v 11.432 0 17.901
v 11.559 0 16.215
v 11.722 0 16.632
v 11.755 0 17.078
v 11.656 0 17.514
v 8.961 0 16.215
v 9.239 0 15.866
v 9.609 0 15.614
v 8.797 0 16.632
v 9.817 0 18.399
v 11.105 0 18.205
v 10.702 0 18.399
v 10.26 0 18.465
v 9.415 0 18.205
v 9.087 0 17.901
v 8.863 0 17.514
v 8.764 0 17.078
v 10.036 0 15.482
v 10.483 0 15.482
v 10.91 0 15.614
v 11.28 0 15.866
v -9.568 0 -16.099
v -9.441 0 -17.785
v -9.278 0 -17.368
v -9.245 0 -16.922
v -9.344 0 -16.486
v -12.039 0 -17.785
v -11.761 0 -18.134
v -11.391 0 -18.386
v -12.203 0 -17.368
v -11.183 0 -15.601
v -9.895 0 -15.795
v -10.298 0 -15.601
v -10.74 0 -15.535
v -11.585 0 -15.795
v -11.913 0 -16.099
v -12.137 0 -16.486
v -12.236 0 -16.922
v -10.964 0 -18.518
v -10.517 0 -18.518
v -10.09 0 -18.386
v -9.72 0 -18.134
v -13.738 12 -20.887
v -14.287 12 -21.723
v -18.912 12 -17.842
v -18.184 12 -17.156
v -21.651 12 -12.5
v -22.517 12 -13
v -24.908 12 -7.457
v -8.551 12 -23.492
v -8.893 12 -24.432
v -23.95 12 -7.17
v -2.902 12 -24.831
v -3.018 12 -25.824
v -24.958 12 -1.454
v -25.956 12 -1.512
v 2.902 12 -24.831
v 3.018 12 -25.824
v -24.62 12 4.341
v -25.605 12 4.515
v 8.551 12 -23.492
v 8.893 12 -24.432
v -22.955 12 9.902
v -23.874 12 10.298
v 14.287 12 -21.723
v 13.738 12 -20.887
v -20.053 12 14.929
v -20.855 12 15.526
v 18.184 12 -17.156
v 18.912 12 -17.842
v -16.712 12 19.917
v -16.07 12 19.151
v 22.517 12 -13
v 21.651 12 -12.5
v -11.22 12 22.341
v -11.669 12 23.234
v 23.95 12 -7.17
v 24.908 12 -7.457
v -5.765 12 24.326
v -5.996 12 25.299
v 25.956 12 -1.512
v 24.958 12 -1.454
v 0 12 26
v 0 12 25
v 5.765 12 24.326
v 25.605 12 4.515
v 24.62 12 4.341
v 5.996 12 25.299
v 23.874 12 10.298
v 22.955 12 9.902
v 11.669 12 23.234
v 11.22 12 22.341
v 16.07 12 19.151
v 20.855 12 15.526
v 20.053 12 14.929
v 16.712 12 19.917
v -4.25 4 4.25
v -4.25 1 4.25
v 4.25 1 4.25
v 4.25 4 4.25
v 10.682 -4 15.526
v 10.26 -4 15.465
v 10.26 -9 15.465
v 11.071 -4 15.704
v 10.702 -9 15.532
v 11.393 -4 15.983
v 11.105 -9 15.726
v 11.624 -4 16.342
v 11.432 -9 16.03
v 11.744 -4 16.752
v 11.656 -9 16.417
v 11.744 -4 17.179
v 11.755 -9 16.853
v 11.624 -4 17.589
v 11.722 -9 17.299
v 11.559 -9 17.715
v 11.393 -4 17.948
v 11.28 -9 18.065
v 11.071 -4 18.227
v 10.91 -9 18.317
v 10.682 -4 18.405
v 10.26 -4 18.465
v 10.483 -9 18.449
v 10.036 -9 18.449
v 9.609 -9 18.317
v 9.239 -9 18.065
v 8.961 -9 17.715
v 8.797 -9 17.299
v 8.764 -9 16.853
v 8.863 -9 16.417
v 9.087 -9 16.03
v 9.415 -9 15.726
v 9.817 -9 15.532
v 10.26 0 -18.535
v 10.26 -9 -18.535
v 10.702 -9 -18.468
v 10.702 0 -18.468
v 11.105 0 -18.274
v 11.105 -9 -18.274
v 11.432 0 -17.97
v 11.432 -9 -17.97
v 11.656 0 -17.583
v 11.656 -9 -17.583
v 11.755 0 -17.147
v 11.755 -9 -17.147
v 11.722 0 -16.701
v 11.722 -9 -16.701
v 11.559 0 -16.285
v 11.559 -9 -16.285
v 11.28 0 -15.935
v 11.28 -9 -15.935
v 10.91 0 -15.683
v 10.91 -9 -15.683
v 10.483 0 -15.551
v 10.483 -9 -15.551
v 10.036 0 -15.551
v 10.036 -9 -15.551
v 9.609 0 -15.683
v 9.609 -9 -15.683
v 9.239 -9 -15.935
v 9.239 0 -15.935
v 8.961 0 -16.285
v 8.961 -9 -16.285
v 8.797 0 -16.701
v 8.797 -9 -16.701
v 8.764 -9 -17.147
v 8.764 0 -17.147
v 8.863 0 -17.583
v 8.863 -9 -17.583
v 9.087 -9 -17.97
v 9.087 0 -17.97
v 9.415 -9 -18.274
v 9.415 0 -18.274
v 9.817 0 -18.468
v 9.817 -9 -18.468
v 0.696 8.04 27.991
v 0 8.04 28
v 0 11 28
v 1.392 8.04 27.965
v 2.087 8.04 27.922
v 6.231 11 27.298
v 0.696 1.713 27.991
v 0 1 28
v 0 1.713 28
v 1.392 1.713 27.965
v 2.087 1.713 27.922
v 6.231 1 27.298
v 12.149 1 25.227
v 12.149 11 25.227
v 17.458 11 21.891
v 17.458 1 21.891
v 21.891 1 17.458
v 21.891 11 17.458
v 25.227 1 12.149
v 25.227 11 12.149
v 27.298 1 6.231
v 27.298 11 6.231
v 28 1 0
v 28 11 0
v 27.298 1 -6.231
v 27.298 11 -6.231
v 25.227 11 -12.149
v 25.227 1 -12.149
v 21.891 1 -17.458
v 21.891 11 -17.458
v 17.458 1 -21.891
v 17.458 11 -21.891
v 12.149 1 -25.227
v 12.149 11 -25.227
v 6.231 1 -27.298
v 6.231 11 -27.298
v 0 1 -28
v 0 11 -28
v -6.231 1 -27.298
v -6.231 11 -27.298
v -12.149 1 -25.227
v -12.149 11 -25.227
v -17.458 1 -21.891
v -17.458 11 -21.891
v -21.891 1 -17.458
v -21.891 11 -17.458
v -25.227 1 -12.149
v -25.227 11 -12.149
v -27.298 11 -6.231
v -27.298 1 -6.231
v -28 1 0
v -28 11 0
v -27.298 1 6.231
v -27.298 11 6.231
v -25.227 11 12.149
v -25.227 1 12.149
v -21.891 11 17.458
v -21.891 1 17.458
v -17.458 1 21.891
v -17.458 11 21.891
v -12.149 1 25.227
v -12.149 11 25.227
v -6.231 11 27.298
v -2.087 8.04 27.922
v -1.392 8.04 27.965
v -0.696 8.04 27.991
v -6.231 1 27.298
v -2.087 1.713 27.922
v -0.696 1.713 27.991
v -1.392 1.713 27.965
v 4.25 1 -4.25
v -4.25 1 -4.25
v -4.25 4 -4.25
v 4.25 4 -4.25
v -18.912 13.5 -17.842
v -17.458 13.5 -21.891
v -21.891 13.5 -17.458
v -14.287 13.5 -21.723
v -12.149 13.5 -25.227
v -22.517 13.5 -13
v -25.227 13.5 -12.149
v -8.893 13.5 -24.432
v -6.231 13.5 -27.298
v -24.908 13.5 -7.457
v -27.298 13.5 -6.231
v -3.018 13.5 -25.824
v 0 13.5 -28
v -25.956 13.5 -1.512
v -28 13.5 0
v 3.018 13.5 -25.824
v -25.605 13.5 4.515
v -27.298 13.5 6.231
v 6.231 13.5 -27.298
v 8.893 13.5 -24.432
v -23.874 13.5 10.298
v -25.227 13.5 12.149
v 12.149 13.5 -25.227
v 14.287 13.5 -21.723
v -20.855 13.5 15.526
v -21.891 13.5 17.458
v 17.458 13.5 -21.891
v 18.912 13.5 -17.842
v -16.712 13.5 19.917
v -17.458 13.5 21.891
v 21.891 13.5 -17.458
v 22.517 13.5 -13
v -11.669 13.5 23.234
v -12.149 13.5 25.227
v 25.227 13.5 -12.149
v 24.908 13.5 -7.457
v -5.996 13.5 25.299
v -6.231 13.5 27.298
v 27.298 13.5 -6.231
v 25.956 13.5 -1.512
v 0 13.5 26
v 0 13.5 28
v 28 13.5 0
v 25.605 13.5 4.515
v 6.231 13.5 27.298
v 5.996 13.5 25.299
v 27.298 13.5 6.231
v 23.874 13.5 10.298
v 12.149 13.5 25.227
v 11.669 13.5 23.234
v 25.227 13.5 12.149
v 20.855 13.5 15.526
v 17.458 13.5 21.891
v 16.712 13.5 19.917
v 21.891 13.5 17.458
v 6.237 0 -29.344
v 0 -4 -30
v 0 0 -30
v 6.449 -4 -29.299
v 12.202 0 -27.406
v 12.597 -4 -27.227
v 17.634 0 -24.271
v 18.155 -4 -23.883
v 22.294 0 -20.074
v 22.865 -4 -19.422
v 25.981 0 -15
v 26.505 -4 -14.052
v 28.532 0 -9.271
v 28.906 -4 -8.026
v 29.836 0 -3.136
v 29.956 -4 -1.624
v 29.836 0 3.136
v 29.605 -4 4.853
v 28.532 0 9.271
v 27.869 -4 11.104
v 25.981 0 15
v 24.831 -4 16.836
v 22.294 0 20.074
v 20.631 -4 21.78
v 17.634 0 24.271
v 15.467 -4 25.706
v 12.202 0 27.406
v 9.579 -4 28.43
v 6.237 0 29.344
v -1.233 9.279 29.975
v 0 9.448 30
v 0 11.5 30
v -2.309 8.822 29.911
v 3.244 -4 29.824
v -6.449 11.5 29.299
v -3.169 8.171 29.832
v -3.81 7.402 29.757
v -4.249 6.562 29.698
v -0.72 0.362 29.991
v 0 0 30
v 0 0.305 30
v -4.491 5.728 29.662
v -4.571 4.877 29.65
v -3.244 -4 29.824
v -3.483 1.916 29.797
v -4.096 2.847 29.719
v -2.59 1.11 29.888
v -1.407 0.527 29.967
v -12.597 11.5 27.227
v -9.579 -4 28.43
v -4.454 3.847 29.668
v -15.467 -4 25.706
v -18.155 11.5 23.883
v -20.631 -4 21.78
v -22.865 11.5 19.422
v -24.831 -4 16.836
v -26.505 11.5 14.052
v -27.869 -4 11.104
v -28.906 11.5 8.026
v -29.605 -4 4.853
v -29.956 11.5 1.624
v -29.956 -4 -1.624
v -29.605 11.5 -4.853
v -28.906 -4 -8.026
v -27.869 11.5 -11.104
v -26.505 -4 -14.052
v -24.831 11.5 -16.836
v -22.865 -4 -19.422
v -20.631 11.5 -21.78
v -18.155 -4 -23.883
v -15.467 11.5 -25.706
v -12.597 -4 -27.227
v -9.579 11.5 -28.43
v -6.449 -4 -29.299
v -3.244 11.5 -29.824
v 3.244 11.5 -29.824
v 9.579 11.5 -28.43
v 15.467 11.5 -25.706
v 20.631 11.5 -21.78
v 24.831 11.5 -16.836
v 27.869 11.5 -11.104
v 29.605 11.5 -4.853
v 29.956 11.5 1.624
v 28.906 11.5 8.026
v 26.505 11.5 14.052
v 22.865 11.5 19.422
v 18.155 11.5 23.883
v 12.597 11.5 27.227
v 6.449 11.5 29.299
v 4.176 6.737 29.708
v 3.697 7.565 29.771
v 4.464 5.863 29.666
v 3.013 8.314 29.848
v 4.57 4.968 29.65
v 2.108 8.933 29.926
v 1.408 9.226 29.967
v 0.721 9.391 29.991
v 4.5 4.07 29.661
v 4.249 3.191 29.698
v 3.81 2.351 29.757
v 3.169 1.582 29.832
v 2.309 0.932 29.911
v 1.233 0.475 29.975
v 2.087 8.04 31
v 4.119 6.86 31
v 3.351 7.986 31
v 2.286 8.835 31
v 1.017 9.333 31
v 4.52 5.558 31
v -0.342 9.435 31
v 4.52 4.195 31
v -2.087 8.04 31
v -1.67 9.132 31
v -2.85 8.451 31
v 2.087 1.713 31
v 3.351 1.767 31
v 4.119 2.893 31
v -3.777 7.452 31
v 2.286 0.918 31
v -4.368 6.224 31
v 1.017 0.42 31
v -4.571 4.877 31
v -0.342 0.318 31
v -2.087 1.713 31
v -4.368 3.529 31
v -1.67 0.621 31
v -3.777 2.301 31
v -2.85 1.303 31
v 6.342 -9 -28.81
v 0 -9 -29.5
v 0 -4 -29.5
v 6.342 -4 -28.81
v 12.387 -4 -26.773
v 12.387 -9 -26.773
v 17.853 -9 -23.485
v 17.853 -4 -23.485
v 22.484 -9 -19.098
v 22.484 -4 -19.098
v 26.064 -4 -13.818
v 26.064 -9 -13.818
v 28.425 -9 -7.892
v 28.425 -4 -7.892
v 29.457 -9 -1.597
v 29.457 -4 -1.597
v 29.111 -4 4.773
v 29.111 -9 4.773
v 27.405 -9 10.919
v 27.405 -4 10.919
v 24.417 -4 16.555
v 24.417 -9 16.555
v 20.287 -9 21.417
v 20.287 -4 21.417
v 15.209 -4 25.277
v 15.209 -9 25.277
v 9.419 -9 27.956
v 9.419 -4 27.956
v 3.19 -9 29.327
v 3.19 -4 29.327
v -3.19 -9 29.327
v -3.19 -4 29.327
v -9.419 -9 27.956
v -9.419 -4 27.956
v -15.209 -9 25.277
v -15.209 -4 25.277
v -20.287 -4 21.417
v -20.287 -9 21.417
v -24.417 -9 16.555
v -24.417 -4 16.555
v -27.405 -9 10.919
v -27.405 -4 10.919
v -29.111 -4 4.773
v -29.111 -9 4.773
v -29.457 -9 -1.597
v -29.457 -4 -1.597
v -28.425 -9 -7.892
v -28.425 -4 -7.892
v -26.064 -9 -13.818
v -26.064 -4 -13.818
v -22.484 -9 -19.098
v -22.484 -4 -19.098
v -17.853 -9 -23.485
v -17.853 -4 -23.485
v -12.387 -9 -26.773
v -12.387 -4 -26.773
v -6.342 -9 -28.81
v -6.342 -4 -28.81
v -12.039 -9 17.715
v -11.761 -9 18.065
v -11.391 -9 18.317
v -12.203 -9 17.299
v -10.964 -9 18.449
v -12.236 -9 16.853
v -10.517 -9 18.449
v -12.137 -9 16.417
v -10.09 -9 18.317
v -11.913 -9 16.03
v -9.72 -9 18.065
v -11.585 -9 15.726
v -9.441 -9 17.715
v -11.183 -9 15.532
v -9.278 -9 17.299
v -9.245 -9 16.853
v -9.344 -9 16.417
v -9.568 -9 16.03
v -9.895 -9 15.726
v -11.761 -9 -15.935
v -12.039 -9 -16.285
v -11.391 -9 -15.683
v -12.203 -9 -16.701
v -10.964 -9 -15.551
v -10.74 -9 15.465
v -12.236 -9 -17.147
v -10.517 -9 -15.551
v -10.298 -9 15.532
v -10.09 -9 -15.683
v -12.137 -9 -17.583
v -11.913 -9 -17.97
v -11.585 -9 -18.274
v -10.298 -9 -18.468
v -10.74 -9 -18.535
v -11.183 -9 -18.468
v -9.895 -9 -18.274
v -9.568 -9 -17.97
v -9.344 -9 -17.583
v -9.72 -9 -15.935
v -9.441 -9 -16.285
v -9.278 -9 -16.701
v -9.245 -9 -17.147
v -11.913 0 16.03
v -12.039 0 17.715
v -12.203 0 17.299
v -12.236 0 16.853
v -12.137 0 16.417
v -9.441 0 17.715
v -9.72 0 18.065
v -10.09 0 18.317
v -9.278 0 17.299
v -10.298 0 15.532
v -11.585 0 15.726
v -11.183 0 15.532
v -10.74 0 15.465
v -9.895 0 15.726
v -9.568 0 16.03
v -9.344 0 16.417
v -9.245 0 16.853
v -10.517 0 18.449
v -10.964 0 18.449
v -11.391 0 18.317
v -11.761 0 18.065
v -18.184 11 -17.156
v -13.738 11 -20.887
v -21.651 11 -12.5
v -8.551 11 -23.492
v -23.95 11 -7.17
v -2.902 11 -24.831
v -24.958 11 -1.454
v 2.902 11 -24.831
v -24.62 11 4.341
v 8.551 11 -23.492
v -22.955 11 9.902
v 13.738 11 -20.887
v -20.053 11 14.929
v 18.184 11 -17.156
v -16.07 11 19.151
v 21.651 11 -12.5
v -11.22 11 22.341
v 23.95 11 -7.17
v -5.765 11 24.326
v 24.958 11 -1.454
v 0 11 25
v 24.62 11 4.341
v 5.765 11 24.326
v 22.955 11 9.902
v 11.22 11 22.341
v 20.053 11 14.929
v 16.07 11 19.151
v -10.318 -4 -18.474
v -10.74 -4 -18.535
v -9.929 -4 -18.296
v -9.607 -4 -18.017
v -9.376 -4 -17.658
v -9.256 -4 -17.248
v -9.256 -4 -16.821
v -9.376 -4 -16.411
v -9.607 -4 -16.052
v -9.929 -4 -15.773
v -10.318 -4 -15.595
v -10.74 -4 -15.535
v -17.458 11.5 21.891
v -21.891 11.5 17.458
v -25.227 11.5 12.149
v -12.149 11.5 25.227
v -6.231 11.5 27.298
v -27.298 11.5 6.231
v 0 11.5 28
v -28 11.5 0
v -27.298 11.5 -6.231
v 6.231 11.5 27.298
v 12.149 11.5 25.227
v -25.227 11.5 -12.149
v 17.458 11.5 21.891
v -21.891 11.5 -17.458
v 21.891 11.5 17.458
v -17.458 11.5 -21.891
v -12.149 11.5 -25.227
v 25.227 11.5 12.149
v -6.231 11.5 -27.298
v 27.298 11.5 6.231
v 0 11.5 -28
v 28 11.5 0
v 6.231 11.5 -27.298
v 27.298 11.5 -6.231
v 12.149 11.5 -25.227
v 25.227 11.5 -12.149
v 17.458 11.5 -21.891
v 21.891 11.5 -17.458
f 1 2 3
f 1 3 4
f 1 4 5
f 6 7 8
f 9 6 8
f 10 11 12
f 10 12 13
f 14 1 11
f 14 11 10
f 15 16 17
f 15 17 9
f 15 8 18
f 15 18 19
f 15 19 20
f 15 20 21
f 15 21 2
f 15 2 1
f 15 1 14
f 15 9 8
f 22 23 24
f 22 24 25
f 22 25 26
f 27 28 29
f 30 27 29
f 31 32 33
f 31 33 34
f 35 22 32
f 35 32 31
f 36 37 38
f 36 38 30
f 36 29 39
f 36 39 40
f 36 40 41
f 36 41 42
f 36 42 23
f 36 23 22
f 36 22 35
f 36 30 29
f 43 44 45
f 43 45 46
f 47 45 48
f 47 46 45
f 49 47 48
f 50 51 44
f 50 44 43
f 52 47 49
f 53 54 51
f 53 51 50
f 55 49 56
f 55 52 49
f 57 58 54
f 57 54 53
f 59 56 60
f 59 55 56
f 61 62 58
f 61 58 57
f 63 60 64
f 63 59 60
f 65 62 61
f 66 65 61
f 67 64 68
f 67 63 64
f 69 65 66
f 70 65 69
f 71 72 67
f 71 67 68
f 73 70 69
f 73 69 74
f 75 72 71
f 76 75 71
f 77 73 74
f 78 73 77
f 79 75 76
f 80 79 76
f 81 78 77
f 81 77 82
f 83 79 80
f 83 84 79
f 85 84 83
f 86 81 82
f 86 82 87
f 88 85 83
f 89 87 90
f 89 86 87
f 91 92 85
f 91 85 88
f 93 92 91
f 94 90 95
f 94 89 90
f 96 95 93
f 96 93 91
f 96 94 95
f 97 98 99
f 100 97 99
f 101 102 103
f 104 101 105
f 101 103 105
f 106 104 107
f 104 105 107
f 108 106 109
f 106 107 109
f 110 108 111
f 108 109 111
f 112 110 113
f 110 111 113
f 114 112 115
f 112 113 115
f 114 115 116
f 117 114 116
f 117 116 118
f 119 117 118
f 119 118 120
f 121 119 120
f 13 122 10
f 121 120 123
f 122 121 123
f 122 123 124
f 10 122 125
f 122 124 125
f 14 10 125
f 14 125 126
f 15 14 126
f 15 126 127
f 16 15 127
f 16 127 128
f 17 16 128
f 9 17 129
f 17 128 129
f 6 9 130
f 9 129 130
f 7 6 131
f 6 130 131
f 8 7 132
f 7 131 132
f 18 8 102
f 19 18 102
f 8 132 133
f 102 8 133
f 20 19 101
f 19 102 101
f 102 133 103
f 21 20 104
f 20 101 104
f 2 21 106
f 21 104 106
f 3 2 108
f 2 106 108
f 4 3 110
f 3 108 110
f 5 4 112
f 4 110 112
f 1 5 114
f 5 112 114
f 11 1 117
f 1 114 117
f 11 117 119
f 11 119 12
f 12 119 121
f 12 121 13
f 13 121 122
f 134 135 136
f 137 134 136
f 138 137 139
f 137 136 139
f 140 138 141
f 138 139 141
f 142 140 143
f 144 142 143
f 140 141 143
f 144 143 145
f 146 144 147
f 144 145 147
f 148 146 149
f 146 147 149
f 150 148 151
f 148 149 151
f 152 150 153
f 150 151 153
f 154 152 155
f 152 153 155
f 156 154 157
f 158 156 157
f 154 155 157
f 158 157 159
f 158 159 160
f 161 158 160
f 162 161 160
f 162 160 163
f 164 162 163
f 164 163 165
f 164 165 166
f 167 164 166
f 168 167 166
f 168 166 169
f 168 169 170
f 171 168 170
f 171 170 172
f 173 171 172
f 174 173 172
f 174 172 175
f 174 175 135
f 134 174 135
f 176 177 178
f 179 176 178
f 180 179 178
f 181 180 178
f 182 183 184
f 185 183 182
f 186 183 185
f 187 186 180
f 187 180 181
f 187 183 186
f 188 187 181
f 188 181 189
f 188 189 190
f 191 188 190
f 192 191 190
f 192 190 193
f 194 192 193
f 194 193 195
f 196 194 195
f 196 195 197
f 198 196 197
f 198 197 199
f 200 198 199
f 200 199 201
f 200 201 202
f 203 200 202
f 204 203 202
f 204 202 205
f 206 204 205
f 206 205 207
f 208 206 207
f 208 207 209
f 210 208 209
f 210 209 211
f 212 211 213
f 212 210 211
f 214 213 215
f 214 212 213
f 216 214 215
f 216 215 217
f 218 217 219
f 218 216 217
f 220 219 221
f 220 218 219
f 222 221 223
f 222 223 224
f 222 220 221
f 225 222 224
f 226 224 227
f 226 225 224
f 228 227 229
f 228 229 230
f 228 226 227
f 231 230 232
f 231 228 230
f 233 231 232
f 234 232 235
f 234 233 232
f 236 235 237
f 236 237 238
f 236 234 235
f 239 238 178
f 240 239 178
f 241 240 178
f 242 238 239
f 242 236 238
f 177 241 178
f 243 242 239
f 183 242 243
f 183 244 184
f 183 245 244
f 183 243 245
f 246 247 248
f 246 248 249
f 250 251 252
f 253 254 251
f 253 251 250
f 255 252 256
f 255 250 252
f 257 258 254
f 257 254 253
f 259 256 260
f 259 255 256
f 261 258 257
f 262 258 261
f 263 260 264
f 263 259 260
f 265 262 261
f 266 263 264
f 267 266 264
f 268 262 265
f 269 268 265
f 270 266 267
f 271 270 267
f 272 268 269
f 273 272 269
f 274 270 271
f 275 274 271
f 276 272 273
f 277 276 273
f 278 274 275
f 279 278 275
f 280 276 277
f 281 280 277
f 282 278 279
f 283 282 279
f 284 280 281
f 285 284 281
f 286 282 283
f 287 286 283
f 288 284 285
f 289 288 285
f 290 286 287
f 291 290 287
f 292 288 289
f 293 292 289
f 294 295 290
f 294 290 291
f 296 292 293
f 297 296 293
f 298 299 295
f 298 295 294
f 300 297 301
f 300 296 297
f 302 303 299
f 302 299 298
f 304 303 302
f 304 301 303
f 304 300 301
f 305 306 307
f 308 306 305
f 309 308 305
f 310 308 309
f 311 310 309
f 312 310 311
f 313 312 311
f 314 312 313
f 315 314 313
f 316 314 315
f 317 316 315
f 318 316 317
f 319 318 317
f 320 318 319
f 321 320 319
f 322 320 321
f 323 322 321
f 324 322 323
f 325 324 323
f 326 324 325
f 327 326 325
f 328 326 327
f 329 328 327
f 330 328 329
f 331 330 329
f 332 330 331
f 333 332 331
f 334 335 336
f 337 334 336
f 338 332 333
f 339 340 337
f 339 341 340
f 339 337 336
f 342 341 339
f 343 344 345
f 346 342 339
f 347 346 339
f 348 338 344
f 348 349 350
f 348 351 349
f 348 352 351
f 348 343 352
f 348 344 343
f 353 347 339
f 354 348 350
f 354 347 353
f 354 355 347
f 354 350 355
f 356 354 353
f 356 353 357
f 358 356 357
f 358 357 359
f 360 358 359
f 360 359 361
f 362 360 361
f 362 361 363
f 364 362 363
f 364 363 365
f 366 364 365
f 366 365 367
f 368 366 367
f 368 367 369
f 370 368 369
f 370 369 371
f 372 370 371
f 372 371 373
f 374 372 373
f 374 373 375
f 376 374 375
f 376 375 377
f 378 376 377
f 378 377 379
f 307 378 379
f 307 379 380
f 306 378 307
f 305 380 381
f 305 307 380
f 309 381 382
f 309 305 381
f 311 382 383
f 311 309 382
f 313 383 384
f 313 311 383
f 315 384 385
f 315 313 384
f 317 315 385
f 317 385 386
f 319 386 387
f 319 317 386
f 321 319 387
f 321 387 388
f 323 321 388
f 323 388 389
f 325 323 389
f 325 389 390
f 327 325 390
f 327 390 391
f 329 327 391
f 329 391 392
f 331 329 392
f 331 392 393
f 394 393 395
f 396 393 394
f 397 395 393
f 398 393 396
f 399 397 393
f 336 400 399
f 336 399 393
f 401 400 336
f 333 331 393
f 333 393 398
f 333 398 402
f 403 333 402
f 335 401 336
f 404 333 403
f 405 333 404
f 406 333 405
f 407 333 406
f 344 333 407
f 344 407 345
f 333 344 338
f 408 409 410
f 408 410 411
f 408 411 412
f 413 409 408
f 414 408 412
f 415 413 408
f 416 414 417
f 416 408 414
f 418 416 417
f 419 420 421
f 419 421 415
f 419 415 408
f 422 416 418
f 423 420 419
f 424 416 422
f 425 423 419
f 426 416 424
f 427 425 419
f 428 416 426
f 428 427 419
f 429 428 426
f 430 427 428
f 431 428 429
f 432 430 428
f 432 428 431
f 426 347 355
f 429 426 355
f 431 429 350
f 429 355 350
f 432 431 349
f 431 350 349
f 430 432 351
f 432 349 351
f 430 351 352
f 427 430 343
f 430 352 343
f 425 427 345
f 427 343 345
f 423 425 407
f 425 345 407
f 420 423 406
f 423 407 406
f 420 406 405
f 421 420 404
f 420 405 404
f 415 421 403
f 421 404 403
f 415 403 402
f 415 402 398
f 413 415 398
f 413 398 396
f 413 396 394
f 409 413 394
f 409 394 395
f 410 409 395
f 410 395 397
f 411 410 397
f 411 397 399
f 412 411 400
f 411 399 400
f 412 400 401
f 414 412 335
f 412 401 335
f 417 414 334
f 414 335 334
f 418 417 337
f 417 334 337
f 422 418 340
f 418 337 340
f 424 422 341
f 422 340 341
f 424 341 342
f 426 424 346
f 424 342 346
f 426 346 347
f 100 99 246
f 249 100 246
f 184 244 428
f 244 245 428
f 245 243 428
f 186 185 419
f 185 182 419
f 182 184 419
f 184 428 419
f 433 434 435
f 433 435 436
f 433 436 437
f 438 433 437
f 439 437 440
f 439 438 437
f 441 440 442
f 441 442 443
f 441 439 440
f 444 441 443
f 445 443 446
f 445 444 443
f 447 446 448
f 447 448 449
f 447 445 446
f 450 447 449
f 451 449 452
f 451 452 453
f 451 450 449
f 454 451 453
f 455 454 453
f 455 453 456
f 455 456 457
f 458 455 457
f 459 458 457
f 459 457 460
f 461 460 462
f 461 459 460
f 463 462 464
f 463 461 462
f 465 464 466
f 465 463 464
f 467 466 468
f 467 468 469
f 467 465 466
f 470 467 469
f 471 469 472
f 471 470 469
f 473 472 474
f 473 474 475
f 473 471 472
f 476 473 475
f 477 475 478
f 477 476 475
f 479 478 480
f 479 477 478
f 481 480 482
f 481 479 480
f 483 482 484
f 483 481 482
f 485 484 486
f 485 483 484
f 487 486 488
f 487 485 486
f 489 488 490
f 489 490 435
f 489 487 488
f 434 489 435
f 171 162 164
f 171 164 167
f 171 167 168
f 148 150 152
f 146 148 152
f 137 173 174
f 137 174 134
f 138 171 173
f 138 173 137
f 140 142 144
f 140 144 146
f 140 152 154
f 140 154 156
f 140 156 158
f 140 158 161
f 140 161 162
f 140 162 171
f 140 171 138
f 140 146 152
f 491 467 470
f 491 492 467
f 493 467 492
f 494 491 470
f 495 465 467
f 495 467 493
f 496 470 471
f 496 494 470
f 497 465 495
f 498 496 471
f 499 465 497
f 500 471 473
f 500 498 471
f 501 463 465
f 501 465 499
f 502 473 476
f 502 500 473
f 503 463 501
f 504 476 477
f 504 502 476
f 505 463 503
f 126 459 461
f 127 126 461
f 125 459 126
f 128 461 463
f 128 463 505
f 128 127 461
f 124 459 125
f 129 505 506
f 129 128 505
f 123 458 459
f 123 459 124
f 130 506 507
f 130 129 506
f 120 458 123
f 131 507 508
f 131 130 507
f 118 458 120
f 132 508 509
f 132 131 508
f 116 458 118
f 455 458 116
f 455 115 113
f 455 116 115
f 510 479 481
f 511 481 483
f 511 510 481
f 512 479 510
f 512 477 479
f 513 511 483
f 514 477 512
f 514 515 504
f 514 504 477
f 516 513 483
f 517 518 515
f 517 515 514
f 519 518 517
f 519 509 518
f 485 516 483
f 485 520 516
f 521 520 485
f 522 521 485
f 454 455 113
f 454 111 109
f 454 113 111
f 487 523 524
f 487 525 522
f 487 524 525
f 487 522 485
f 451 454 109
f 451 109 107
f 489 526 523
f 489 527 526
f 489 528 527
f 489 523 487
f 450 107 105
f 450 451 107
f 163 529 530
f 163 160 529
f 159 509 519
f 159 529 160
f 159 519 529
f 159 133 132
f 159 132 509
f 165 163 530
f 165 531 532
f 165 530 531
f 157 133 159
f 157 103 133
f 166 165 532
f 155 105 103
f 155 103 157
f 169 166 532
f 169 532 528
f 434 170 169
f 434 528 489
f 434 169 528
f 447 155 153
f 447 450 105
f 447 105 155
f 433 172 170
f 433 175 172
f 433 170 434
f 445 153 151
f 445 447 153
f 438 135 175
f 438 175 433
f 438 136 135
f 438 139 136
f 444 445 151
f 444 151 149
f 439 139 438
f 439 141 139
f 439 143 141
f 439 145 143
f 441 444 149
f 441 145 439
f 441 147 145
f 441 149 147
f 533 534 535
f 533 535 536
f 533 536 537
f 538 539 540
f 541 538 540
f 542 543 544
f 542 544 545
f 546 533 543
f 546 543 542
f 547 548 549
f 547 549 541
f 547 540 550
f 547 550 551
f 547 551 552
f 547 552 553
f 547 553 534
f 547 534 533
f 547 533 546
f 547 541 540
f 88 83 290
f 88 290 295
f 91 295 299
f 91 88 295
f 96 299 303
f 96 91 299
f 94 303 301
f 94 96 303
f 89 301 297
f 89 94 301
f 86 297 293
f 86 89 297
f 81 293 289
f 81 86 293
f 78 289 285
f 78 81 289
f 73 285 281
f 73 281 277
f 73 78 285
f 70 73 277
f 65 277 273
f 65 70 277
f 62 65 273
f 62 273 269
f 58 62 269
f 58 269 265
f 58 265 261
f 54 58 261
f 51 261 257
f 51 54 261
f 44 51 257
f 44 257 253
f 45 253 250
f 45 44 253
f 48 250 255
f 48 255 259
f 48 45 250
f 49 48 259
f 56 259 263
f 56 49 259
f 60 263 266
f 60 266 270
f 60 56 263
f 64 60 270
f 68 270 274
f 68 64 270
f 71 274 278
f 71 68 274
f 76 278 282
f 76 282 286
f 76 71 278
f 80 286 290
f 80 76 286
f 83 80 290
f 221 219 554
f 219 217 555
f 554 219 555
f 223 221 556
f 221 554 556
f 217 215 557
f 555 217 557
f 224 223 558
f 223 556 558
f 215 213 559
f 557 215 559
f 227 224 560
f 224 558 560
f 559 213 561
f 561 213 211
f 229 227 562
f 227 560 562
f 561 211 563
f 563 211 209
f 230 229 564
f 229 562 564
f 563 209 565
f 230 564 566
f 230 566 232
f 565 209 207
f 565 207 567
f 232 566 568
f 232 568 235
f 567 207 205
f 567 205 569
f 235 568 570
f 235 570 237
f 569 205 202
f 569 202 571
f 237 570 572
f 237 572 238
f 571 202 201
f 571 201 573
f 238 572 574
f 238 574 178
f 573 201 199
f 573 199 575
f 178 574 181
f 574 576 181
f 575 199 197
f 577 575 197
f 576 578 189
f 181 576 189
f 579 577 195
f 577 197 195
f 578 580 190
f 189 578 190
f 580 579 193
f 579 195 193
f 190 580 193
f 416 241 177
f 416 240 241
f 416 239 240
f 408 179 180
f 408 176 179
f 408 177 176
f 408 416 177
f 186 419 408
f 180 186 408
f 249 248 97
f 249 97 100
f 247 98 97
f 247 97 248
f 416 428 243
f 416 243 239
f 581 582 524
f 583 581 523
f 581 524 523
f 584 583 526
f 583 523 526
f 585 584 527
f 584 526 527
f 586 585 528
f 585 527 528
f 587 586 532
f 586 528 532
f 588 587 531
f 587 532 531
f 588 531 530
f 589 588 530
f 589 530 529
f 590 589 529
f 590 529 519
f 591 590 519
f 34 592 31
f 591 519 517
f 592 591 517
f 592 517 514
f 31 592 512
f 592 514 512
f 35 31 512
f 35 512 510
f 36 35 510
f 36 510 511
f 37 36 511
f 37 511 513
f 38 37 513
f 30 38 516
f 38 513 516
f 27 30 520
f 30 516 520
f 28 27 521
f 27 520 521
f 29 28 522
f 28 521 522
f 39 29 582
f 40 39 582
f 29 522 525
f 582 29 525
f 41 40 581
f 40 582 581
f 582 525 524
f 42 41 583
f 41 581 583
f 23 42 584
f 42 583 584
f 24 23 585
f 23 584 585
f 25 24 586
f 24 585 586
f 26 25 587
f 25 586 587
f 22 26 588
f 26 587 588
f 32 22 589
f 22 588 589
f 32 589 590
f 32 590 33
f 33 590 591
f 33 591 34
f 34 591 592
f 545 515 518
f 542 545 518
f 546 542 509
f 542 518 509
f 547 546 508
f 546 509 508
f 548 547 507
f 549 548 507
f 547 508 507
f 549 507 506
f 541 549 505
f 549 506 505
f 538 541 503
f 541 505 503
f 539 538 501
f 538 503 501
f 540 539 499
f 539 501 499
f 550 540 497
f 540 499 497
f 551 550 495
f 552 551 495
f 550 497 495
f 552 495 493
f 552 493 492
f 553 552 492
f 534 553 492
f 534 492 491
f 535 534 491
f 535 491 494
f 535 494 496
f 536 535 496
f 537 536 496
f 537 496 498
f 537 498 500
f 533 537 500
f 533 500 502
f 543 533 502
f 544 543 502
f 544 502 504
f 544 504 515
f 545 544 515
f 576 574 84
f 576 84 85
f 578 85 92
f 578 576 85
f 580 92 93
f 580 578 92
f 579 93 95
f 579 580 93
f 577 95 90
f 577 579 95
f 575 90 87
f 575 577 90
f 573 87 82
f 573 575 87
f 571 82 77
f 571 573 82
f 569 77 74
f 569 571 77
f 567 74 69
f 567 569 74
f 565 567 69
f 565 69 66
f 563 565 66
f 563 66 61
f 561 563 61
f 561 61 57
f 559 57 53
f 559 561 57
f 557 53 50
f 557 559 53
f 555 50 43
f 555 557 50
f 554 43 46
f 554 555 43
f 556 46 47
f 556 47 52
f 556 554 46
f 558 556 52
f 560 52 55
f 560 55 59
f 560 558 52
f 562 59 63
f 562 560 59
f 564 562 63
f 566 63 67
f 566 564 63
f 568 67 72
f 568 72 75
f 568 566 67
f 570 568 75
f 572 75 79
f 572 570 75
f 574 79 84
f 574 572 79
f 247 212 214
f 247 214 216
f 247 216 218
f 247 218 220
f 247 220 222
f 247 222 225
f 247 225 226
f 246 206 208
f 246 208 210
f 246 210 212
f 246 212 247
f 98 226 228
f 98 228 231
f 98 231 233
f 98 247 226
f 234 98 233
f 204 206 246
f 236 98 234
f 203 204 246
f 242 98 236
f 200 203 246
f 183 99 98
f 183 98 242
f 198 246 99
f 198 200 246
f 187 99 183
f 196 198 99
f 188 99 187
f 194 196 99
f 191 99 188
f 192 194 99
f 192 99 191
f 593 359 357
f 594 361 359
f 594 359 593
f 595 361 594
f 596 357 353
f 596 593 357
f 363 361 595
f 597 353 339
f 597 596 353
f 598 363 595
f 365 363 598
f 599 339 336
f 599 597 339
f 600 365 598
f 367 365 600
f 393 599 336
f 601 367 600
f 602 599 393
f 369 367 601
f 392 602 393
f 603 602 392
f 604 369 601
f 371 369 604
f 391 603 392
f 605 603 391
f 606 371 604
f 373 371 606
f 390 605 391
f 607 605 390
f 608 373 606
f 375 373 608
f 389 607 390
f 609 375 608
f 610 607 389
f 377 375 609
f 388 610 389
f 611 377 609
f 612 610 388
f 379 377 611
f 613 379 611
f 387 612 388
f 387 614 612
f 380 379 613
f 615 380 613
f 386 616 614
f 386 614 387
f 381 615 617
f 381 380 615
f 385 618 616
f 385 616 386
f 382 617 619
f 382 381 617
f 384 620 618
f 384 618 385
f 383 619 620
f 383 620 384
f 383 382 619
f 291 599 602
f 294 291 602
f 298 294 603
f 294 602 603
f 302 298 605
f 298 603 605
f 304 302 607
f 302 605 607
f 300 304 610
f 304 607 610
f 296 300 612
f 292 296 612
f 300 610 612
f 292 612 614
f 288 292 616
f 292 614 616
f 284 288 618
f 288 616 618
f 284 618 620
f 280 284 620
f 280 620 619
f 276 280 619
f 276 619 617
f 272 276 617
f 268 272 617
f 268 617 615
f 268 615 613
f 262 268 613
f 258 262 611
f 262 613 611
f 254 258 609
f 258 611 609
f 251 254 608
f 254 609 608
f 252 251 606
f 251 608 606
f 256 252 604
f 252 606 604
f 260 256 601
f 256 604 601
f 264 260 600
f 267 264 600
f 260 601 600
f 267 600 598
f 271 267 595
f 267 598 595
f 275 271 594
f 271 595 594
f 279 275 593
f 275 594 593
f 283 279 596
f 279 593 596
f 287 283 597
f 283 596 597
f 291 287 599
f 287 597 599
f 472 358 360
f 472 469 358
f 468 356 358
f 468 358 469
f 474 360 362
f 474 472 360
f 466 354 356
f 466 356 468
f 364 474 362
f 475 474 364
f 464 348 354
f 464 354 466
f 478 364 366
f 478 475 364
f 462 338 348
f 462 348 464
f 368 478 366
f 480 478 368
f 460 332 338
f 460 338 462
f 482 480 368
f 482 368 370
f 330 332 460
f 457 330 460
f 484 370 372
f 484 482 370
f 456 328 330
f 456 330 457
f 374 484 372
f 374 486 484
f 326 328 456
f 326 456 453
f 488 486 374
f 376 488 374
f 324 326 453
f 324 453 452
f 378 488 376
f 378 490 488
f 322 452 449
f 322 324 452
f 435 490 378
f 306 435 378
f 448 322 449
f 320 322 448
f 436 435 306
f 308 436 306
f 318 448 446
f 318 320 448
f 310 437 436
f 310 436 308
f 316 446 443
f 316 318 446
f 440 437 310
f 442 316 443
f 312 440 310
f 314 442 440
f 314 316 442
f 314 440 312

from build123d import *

# Parameters (mm, degrees)
SKETCH_1_R          = 30
EXTRUDE_1_DEPTH     = 1
SKETCH_10_R         = 30
SKETCH_10_R_2       = 28
EXTRUDE_4_DEPTH     = 10
SKETCH_11_W         = 8.5
SKETCH_11_H         = 8.5
EXTRUDE_5_DEPTH     = 3
EXTRUDE_START       = 29
SKETCH_17_R         = 4.571283513
EXTRUDE_6_DEPTH     = 2
SKETCH_18_W         = 4.174244664
SKETCH_18_H         = 6.326589568
CUT_EXTRUDE_5_DEPTH = 10
SKETCH_19_R         = 30
SKETCH_19_R_2       = 25
EXTRUDE_7_DEPTH     = 1
SKETCH_23_R         = 30
SKETCH_23_R_2       = 26
EXTRUDE_8_DEPTH     = 1.5
CUT_EXTRUDE_START   = -2
SKETCH_24_R         = 32
SKETCH_24_R_2       = 28
CUT_EXTRUDE_6_DEPTH = 2
EXTRUDE_START_2     = 4
SKETCH_25_R         = 30
EXTRUDE_9_DEPTH     = 4
SKETCH_26_R         = 1.5
CUT_EXTRUDE_7_DEPTH = 4
EXTRUDE_START_3     = 5
SKETCH_27_R         = 29.5
SKETCH_27_R_2       = 1.5
EXTRUDE_10_DEPTH    = 5


with BuildPart() as part:
    # 草图1 → 凸台-拉伸1 (new body)
    with BuildSketch(Plane(origin=(0, 0, 0), x_dir=(1, 0, 0), z_dir=(0, 1, 0))):
        with Locations(Location((0, 0, 0), (0, 0, 270))):
            Circle(SKETCH_1_R)
    extrude(amount=EXTRUDE_1_DEPTH)

    # 草图10 → 凸台-拉伸4 (add)
    with BuildSketch(Plane(origin=(0, 1, 0), x_dir=(1, 0, 0), z_dir=(0, 1, 0))):
        with Locations(Location((0, 0, 0), (0, 0, 270))):
            Circle(SKETCH_10_R)
        with Locations(Location((0, 0, 0), (0, 0, 270))):
            Circle(SKETCH_10_R_2, mode=Mode.SUBTRACT)
    extrude(amount=EXTRUDE_4_DEPTH)

    # 草图11 → 凸台-拉伸5 (add)
    with BuildSketch(Plane(origin=(0, 1, 0), x_dir=(1, 0, 0), z_dir=(0, 1, 0))):
        Rectangle(SKETCH_11_W, SKETCH_11_H)
    extrude(amount=EXTRUDE_5_DEPTH)

    # 草图17 → 凸台-拉伸6 (add)
    with BuildSketch(Plane.XY.offset(EXTRUDE_START)):
        with Locations(Location((0, 4.876571378, 0), (0, 0, 180))):
            Circle(SKETCH_17_R)
    extrude(amount=EXTRUDE_6_DEPTH)

    # 草图18 → 切除-拉伸5 (cut)
    with BuildSketch(Plane.XY.offset(31)):
        with Locations((0, 4.876571378)):
            Rectangle(SKETCH_18_W, SKETCH_18_H)
    extrude(amount=-CUT_EXTRUDE_5_DEPTH, mode=Mode.SUBTRACT)

    # 草图19 → 凸台-拉伸7 (add)
    with BuildSketch(Plane(origin=(0, 11, 0), x_dir=(1, 0, 0), z_dir=(0, 1, 0))):
        with Locations(Location((0, 0, 0), (0, 0, 270))):
            Circle(SKETCH_19_R)
        with Locations(Location((0, 0, 0), (0, 0, 270))):
            Circle(SKETCH_19_R_2, mode=Mode.SUBTRACT)
    extrude(amount=EXTRUDE_7_DEPTH)

    # 草图23 → 凸台-拉伸8 (add)
    with BuildSketch(Plane(origin=(0, 12, 0), x_dir=(1, 0, 0), z_dir=(0, 1, 0))):
        with Locations(Location((0, 0, 0), (0, 0, 270))):
            Circle(SKETCH_23_R)
        with Locations(Location((0, 0, 0), (0, 0, 270))):
            Circle(SKETCH_23_R_2, mode=Mode.SUBTRACT)
    extrude(amount=EXTRUDE_8_DEPTH)

    # 草图24 → 切除-拉伸6 (cut)
    with BuildSketch(Plane(origin=(0, 13.5, 0), x_dir=(1, 0, 0), z_dir=(0, 1, 0)).offset(CUT_EXTRUDE_START)):
        Circle(SKETCH_24_R)
        with Locations(Location((0, 0, 0), (0, 0, 270))):
            Circle(SKETCH_24_R_2, mode=Mode.SUBTRACT)
    extrude(amount=CUT_EXTRUDE_6_DEPTH, mode=Mode.SUBTRACT)

    # 草图25 → 凸台-拉伸9 (add)
    with BuildSketch(Plane.XZ.offset(EXTRUDE_START_2)):
        with Locations(Location((0, 0, 0), (0, 0, 270))):
            Circle(SKETCH_25_R)
    extrude(amount=-EXTRUDE_9_DEPTH)

    # 草图26 → 切除-拉伸7 (cut)
    with BuildSketch(Plane(origin=(0, -4, 0), x_dir=(-1, 0, 0), z_dir=(0, -1, 0))):
        with Locations(Location((-10.25961511, 17.034507364, 0), (0, 0, 90))):
            Circle(SKETCH_26_R)
        with Locations(Location((10.74038489, 17.034507364, 0), (0, 0, 270))):
            Circle(SKETCH_26_R)
        with Locations(Location((10.74038489, -16.965492636, 0), (0, 0, 90))):
            Circle(SKETCH_26_R)
        with Locations(Location((-10.25961511, -16.965492636, 0), (0, 0, 270))):
            Circle(SKETCH_26_R)
    extrude(amount=-CUT_EXTRUDE_7_DEPTH, mode=Mode.SUBTRACT)

    # 草图27 → 凸台-拉伸10 (add)
    with BuildSketch(Plane.XZ.offset(4).offset(EXTRUDE_START_3)):
        with Locations(Location((0, 0, 0), (0, 0, 270))):
            Circle(SKETCH_27_R)
        with Locations(Location((-10.74038489, 16.965492636, 0), (0, 0, 270))):
            Circle(SKETCH_27_R_2, mode=Mode.SUBTRACT)
        with Locations(Location((-10.74038489, -17.034507364, 0), (0, 0, 270))):
            Circle(SKETCH_27_R_2, mode=Mode.SUBTRACT)
        with Locations(Location((10.25961511, -17.034507364, 0), (0, 0, 270))):
            Circle(SKETCH_27_R_2, mode=Mode.SUBTRACT)
        with Locations(Location((10.25961511, 16.965492636, 0), (0, 0, 270))):
            Circle(SKETCH_27_R_2, mode=Mode.SUBTRACT)
    extrude(amount=-EXTRUDE_10_DEPTH)


solid = part.part
